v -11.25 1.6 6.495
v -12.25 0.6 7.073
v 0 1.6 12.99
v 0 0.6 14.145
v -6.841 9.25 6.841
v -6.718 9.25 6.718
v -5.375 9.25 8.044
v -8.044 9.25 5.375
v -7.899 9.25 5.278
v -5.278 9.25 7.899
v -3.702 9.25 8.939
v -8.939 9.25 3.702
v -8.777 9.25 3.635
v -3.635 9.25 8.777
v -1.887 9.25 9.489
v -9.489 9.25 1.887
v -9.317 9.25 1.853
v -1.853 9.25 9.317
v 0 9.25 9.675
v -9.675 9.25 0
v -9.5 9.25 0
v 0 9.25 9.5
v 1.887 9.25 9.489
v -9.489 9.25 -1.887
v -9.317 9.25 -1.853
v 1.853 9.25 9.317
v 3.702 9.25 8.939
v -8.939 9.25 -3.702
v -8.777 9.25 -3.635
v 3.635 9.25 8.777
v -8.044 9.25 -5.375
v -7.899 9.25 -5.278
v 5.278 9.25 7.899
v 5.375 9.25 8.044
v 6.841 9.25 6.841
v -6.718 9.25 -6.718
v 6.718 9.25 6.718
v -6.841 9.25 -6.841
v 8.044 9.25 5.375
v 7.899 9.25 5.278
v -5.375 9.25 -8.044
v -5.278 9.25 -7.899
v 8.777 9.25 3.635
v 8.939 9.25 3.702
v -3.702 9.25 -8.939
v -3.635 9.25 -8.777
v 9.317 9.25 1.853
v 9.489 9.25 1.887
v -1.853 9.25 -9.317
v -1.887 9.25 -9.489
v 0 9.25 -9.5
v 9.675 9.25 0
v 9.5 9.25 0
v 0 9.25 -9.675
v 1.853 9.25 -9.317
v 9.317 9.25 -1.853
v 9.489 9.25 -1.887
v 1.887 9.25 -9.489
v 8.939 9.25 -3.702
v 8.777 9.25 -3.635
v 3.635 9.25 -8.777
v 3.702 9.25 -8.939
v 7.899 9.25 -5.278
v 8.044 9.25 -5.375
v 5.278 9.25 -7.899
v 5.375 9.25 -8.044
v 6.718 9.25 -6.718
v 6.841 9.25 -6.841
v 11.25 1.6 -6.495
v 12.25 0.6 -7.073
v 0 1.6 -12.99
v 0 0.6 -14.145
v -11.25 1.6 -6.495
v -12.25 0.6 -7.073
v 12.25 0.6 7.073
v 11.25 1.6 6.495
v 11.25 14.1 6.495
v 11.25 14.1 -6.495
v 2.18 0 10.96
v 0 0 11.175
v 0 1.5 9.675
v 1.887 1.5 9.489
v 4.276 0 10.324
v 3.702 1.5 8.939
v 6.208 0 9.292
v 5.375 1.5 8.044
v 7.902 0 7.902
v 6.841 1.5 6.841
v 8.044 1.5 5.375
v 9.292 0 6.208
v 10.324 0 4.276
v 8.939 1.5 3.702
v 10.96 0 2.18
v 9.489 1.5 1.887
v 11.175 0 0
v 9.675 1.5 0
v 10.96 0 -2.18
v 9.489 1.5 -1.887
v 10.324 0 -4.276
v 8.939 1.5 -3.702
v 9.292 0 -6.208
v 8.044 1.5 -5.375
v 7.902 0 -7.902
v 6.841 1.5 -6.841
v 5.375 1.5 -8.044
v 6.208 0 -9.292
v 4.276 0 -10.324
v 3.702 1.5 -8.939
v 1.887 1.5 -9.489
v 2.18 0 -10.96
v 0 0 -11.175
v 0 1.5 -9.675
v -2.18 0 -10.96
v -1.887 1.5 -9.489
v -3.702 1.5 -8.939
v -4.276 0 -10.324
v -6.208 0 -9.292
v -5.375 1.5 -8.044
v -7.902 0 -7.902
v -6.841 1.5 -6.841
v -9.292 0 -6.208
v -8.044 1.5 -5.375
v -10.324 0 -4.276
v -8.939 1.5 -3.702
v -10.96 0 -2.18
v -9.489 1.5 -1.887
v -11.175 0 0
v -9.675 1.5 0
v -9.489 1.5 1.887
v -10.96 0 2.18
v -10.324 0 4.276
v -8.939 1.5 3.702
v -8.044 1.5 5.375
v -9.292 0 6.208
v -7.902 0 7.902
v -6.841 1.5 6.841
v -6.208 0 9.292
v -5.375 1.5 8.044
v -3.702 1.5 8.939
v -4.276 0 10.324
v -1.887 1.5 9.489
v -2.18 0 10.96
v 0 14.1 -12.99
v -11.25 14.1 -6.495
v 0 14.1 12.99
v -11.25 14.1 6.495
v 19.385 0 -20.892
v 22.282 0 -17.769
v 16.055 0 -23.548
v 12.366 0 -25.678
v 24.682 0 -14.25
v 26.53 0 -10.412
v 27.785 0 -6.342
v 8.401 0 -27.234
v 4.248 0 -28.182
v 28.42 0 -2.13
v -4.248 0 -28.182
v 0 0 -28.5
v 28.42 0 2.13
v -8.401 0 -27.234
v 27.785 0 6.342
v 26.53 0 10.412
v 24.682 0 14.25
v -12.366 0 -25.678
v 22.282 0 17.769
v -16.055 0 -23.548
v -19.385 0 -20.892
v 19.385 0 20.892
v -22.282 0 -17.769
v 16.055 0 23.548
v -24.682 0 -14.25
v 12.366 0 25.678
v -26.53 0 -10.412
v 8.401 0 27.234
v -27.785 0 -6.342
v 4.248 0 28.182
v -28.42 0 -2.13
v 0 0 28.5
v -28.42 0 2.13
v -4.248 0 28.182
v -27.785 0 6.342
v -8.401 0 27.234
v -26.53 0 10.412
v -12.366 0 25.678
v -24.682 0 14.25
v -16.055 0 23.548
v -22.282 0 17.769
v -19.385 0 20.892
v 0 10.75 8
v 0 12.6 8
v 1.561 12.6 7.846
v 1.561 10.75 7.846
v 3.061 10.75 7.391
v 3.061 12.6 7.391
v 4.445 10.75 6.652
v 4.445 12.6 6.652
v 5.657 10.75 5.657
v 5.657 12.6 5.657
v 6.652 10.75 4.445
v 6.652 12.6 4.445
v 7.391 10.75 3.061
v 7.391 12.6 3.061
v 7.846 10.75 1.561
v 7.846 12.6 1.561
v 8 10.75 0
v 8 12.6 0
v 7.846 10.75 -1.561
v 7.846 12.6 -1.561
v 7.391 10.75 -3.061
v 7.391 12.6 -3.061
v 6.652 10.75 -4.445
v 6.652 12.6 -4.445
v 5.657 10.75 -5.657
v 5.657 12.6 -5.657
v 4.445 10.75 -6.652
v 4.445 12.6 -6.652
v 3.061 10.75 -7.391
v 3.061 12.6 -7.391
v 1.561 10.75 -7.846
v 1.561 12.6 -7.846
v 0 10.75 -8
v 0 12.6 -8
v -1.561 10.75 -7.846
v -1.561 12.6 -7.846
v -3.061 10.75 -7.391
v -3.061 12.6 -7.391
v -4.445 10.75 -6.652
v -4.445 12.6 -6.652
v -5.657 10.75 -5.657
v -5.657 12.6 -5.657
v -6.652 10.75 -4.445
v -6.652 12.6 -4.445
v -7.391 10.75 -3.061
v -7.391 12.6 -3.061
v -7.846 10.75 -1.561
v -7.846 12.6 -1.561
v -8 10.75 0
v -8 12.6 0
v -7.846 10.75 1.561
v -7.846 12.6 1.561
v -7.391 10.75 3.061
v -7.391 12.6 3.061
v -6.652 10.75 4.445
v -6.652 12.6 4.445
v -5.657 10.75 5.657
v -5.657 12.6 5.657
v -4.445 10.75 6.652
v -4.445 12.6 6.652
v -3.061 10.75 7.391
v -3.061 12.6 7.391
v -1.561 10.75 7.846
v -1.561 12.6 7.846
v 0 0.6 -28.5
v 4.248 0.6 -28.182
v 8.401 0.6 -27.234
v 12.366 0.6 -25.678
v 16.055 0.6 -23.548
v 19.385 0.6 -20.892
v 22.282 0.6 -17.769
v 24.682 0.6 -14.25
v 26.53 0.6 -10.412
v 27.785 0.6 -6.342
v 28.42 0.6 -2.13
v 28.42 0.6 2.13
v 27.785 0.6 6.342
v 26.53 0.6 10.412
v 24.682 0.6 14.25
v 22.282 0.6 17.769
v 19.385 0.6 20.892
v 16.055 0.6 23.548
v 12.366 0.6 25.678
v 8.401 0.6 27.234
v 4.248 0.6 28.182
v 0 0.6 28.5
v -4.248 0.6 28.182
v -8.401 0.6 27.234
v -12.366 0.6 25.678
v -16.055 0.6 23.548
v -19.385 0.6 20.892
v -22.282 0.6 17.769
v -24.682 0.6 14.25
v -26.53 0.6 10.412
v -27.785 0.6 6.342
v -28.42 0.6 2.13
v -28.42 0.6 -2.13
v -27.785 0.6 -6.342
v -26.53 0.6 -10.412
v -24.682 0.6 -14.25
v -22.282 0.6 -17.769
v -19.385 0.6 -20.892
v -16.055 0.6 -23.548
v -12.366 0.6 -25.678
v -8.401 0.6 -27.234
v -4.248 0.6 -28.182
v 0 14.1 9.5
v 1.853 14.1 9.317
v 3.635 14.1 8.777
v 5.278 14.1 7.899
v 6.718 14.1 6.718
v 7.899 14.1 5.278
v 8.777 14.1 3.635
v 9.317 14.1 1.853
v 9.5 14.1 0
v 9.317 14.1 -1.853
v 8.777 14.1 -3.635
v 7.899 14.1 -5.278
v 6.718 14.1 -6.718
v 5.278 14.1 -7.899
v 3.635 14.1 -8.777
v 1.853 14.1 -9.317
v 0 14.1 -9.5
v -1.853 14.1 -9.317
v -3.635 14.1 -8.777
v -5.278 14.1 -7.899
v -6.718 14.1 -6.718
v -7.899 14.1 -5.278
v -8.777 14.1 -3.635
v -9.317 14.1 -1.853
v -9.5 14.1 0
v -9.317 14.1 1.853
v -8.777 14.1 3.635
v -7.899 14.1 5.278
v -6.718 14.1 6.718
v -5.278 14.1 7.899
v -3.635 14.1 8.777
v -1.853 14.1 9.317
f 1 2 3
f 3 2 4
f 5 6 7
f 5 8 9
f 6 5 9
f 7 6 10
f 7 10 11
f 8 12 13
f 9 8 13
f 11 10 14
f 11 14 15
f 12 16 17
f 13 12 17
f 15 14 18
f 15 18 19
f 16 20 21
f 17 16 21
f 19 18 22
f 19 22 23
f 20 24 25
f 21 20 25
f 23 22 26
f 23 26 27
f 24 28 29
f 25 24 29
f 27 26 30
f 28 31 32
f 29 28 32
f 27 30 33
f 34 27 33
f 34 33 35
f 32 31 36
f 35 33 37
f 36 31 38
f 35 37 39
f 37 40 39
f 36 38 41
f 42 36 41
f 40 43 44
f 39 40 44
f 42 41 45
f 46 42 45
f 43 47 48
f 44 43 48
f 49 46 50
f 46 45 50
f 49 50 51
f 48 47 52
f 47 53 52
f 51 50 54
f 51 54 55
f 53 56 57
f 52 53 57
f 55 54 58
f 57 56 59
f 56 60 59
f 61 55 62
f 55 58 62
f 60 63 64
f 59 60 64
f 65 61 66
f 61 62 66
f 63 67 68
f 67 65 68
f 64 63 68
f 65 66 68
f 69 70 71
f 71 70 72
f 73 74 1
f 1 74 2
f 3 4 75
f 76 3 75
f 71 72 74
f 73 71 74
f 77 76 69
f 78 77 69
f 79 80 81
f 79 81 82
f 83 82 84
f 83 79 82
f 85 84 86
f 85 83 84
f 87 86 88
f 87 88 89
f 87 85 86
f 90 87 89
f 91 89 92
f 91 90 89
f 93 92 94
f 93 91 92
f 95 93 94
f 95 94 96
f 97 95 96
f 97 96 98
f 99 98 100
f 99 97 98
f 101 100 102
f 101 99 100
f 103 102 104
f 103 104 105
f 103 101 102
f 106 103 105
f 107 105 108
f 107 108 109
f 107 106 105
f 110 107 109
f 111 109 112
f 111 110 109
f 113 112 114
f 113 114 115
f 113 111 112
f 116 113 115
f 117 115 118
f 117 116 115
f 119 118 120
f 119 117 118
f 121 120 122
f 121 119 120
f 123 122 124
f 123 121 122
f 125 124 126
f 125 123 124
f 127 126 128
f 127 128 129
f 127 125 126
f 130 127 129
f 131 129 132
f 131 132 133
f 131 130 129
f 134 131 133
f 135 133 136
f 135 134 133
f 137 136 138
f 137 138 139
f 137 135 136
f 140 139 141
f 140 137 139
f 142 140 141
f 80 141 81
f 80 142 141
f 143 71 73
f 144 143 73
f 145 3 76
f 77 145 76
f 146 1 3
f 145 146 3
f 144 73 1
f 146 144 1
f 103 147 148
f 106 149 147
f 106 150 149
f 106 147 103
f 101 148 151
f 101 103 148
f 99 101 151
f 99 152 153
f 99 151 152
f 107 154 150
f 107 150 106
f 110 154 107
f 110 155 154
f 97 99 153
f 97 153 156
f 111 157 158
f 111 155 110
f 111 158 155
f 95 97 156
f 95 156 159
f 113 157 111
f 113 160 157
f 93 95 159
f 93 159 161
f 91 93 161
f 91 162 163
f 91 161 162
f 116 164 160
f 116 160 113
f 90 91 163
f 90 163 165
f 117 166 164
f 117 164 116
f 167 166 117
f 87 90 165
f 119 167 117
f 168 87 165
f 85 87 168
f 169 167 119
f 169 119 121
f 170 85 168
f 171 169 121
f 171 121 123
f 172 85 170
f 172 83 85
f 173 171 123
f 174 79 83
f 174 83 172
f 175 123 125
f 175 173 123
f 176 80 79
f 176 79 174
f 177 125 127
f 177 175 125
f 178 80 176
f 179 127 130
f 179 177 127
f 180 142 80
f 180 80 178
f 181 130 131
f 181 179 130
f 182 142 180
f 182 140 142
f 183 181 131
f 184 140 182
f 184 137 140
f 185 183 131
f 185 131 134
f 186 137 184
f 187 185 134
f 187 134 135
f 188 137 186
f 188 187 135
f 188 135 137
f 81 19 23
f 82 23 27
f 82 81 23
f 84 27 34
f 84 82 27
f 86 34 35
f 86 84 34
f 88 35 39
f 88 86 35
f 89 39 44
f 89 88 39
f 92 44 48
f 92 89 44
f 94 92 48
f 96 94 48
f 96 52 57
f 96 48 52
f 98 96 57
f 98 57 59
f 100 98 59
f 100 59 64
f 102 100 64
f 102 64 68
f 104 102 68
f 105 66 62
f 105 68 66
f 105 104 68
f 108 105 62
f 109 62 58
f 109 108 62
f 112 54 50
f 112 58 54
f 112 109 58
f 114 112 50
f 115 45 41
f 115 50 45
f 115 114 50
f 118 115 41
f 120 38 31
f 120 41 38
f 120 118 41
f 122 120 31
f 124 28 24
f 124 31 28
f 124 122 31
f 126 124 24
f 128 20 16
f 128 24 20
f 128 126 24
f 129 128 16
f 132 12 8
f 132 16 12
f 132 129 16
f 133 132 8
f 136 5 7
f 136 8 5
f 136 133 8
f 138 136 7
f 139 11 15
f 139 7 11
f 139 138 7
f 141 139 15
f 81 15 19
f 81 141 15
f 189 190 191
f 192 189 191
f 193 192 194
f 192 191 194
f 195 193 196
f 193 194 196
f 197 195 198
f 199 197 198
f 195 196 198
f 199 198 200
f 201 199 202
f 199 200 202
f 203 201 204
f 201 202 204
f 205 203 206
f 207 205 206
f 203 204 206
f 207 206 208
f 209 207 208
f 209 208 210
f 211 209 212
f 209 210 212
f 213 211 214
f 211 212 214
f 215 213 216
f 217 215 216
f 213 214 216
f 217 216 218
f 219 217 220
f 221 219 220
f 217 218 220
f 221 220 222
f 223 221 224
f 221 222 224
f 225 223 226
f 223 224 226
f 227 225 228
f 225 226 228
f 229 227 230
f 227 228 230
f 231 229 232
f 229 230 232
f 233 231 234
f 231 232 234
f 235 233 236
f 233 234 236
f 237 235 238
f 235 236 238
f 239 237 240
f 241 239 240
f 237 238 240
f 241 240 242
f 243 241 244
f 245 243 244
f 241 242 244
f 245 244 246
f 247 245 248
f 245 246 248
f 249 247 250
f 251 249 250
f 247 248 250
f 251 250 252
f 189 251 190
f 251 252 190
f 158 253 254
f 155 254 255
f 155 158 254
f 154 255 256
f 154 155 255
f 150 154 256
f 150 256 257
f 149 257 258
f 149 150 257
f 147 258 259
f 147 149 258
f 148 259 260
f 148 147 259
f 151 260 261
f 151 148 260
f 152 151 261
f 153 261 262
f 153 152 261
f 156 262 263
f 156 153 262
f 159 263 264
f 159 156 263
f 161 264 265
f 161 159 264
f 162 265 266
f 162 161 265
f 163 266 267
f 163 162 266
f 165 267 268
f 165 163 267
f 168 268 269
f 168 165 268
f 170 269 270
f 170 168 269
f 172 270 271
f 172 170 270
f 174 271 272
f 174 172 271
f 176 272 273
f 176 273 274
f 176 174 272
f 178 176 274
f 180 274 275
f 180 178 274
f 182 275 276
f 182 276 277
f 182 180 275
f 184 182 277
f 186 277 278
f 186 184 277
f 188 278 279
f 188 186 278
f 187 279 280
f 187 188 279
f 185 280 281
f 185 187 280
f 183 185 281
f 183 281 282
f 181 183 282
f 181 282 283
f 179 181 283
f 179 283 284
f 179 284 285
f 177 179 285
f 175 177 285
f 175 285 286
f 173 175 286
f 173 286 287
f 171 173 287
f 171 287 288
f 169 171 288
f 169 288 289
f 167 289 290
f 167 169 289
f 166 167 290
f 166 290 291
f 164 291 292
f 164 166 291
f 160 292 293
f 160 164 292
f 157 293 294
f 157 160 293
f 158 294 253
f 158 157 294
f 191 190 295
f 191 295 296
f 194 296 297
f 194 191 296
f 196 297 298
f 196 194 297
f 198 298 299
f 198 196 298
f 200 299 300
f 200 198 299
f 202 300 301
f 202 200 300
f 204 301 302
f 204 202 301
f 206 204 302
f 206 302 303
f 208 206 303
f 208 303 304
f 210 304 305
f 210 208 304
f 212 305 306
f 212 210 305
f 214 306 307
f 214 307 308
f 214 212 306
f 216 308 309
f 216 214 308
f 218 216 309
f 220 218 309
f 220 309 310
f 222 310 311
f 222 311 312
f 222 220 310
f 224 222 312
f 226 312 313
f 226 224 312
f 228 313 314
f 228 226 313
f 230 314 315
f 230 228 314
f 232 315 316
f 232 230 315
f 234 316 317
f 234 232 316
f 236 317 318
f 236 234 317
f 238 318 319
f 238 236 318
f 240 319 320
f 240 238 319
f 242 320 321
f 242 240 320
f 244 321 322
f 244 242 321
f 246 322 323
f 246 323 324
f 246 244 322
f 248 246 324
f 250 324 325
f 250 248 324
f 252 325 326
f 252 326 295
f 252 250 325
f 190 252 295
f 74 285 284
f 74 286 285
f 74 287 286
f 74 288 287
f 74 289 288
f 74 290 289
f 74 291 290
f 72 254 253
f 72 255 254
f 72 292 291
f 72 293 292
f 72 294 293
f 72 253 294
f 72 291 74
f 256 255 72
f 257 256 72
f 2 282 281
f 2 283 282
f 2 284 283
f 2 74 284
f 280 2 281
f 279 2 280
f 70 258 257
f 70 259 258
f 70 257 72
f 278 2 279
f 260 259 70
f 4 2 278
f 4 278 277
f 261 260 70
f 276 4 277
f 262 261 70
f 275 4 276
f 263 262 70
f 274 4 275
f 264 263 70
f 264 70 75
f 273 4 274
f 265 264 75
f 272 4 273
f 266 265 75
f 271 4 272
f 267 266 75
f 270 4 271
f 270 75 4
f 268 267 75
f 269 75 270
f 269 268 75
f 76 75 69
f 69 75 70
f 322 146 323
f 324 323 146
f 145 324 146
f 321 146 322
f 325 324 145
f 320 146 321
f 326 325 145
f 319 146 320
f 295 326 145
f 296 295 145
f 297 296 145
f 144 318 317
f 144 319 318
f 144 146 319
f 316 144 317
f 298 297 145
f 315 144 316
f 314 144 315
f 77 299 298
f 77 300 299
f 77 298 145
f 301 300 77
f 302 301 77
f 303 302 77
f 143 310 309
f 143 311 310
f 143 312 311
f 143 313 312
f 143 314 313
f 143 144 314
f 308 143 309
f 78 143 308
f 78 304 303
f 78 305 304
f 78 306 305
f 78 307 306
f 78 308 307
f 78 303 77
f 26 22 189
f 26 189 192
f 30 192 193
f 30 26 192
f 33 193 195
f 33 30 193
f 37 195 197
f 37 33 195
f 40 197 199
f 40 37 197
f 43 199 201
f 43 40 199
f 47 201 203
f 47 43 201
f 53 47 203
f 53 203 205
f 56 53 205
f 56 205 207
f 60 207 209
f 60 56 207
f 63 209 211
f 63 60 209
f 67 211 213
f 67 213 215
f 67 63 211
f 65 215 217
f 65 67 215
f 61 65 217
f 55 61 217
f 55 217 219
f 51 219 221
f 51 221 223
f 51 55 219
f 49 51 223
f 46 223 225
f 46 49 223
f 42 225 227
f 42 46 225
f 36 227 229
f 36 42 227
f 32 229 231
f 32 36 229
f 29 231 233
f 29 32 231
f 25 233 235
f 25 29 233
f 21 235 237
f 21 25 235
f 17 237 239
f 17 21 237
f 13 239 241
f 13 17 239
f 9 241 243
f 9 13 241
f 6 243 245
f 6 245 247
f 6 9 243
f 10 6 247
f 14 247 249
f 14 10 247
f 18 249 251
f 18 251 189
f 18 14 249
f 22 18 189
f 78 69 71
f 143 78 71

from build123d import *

# Parameters (mm, degrees)
SKETCH1_R                       = 27
SKETCH1_R_2                     = 9.675
BOSS_EXTRUDE1_DEPTH             = 0.6
SKETCH2_R                       = 9.675
BOSS_EXTRUDE2_DEPTH             = 13.5
SKETCH3_R                       = 10.043523413
SKETCH3_R_2                     = 8
BOSS_EXTRUDE3_DEPTH             = 4.85
CHAMFER1_SIZE                   = 1.5
SKETCH4_R                       = 28.5
SKETCH4_R_2                     = 25
BOSS_EXTRUDE4_DEPTH             = 1.9
BOSS_EXTRUDE4_DIRECTION_2_REACH = 42.704
CHAMFER3_SIZE                   = 1
CUT_EXTRUDE1_START              = -1.9
SKETCH5_R                       = 28.5
CUT_EXTRUDE1_DEPTH              = 1.9


with BuildPart() as part:
    # Sketch1 → Boss-Extrude1 (new body)
    with BuildSketch(Plane(origin=(0, 0, 0), x_dir=(1, 0, 0), z_dir=(0, 1, 0))):
        with Locations(Location((0, 0, 0), (0, 0, 270))):
            Circle(SKETCH1_R)
        with Locations(Location((0, 0, 0), (0, 0, 270))):
            Circle(SKETCH1_R_2, mode=Mode.SUBTRACT)
    extrude(amount=BOSS_EXTRUDE1_DEPTH)

    # Sketch2 → Boss-Extrude2 (add)
    with BuildSketch(Plane(origin=(0, 0.6, 0), x_dir=(1, 0, 0), z_dir=(0, 1, 0))):
        Polygon((0, 12.990381057), (-11.25, 6.495190528), (-11.25, -6.495190528), (0, -12.990381057), (11.25, -6.495190528), (11.25, 6.495190528), align=None)
        with Locations(Location((0, 0, 0), (0, 0, 270))):
            Circle(SKETCH2_R, mode=Mode.SUBTRACT)
    extrude(amount=BOSS_EXTRUDE2_DEPTH)

    # Sketch3 → Boss-Extrude3 (add)
    with BuildSketch(Plane(origin=(0, 14.1, 0), x_dir=(1, 0, 0), z_dir=(0, 1, 0))):
        Circle(SKETCH3_R)
        with Locations(Location((0, 0, 0), (0, 0, 270))):
            Circle(SKETCH3_R_2, mode=Mode.SUBTRACT)
    extrude(amount=-BOSS_EXTRUDE3_DEPTH)

    # Chamfer1
    chamfer1_edges = [part.edges().sort_by_distance(p)[0] for p in [
        (0, 9.25, -8),
        (0, 14.1, -8),
        (0, 0, -9.675),
    ]]
    chamfer(chamfer1_edges, length=CHAMFER1_SIZE)

    # Sketch4 → Boss-Extrude4 (add)
    with BuildSketch(Plane.XZ):
        with Locations(Location((0, 0, 0), (0, 0, 270))):
            Circle(SKETCH4_R)
        with Locations(Location((0, 0, 0), (0, 0, 270))):
            Circle(SKETCH4_R_2, mode=Mode.SUBTRACT)
    extrude(amount=BOSS_EXTRUDE4_DEPTH)

    # Boss-Extrude4 direction 2: up to this face of the body (flat: up to its plane)
    boss_extrude4_direction_2_end = Plane(part.part.faces().sort_by_distance((0, 0.6, -26.236324676))[0])
    # Sketch4 → Boss-Extrude4 direction 2 (add, up to the picked face)
    with BuildSketch(Plane.XZ, mode=Mode.PRIVATE) as boss_extrude4_direction_2_sk1:
        with Locations(Location((0, 0, 0), (0, 0, 270))):
            Circle(SKETCH4_R)
        with Locations(Location((0, 0, 0), (0, 0, 270))):
            Circle(SKETCH4_R_2, mode=Mode.SUBTRACT)
    boss_extrude4_direction_2_tool1 = split(extrude(boss_extrude4_direction_2_sk1.sketch, amount=-BOSS_EXTRUDE4_DIRECTION_2_REACH, mode=Mode.PRIVATE), bisect_by=boss_extrude4_direction_2_end, keep=Keep.BOTH, mode=Mode.PRIVATE)
    add(boss_extrude4_direction_2_tool1.solids().sort_by(Axis((0, 0, 27.693898), (0, 1, 0)))[0])

    # Chamfer3
    chamfer3_edges = [part.edges().sort_by_distance(p)[0] for p in [
        (5.625, 0.6, -9.742785793),
        (-5.625, 0.6, -9.742785793),
        (-11.25, 0.6, 0),
        (-5.625, 0.6, 9.742785793),
        (5.625, 0.6, 9.742785793),
        (11.25, 0.6, 0),
    ]]
    chamfer(chamfer3_edges, length=CHAMFER3_SIZE)

    # Sketch5 → Cut-Extrude1 (cut)
    with BuildSketch(Plane.XZ.offset(1.9).offset(CUT_EXTRUDE1_START)):
        with Locations(Location((0, 0, 0), (0, 0, 90))):
            Circle(SKETCH5_R)
    extrude(amount=CUT_EXTRUDE1_DEPTH, mode=Mode.SUBTRACT)


solid = part.part
